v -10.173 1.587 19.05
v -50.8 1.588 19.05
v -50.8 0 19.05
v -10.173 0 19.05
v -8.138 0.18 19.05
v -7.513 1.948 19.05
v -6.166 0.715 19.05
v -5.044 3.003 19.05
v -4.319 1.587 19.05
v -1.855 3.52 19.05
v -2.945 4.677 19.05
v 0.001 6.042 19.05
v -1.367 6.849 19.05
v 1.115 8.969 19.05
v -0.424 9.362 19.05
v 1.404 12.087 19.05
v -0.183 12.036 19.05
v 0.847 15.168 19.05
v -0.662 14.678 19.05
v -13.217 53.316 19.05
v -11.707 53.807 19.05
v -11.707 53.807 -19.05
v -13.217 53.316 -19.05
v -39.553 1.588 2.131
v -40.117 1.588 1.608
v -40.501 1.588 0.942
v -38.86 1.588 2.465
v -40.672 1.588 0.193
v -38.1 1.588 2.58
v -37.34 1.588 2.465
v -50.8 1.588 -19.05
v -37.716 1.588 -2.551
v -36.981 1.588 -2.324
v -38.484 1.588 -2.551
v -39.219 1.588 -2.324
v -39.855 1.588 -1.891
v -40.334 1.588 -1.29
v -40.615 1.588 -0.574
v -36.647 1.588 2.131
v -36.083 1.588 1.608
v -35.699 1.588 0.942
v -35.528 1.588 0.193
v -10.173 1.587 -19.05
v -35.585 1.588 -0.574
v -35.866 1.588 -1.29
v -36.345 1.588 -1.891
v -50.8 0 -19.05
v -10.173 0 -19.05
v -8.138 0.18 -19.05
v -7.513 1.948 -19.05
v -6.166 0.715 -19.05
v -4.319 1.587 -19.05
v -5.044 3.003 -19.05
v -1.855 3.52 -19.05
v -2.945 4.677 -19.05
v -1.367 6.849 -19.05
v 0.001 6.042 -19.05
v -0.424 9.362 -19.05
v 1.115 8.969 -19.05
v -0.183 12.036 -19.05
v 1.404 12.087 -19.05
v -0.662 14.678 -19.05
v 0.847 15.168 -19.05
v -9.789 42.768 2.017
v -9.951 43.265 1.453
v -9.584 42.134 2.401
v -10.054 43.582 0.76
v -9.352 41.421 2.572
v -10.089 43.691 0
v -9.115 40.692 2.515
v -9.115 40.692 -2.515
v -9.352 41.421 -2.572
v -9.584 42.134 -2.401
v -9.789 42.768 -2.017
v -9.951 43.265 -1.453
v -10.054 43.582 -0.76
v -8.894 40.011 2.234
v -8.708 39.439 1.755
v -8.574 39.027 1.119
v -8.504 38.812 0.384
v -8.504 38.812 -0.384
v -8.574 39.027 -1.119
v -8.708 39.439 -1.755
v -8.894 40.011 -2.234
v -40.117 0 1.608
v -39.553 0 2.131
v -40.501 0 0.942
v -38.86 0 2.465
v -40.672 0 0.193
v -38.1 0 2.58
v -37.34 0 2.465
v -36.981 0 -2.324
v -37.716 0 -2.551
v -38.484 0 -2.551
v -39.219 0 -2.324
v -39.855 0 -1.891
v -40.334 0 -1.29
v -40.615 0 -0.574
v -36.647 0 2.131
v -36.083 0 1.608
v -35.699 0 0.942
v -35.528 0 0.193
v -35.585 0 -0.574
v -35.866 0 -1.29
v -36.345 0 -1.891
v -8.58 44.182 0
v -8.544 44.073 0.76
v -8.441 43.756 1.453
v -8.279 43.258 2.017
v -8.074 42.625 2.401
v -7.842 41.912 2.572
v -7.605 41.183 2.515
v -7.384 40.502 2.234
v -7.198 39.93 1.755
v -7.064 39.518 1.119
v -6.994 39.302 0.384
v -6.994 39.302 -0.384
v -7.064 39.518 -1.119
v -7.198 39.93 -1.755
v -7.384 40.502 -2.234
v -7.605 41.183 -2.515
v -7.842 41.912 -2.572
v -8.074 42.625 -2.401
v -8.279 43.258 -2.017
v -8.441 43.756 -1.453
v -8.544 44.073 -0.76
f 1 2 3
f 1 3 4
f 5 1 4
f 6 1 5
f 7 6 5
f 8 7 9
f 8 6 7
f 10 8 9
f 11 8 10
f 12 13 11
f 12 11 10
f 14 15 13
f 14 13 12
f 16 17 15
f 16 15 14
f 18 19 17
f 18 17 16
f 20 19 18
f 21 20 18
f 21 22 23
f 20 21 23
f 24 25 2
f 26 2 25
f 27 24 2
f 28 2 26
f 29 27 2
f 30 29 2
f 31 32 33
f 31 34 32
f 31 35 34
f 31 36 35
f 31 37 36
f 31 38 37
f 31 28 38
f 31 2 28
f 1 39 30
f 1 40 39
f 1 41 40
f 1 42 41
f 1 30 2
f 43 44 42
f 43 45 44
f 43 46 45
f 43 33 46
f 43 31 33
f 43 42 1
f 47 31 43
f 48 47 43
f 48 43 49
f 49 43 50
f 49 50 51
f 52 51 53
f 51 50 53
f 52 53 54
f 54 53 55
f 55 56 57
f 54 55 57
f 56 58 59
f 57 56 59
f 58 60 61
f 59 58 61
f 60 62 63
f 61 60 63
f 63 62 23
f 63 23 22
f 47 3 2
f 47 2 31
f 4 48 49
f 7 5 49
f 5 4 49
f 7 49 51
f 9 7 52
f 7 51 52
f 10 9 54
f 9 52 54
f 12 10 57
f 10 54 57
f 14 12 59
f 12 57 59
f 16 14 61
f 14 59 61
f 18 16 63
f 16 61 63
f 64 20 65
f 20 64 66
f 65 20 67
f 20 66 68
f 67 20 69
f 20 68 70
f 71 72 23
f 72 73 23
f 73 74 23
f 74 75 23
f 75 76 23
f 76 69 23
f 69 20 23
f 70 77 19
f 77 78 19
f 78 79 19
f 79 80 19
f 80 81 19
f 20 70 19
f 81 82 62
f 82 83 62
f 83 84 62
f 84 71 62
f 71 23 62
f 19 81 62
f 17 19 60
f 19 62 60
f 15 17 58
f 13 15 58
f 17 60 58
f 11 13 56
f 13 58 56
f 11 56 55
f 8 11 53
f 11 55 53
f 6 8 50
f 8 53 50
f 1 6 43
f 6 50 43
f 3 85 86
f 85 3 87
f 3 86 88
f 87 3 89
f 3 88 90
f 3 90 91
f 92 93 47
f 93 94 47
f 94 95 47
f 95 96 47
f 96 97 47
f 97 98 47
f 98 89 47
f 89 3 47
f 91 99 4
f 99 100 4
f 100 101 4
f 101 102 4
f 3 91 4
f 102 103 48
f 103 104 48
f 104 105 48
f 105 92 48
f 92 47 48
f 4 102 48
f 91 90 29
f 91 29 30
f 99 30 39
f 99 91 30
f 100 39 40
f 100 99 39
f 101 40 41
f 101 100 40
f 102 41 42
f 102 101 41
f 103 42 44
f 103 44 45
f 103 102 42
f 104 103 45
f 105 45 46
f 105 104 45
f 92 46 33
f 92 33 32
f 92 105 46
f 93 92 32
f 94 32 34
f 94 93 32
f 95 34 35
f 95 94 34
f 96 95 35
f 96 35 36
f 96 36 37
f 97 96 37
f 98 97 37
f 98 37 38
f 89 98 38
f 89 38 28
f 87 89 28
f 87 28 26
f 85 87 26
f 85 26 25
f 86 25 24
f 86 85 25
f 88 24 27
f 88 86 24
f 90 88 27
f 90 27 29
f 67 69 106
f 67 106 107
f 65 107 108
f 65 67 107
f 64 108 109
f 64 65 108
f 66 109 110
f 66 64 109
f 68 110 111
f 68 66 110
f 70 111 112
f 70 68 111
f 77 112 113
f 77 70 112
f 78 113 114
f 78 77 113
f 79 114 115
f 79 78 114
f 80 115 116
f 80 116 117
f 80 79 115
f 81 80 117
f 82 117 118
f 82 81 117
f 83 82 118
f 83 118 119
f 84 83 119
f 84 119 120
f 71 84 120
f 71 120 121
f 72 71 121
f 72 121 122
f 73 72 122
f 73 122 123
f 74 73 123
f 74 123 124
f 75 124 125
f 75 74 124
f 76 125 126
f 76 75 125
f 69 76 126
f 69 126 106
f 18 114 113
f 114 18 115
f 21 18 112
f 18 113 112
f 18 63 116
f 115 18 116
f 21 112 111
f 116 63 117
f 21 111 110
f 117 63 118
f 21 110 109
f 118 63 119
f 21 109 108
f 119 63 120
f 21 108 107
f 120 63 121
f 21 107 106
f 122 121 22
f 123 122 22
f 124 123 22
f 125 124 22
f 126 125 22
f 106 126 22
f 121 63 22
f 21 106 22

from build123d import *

# Parameters (mm, degrees)
SKETCH1_W                  = 101.6
SKETCH1_H                  = 38.1
SKETCH1_R                  = 2.5796875
BOSS_EXTRUDE1_DEPTH        = 1.5875
SKETCHED_START             = -19.05
SKETCHED_BEND1_DEPTH       = 38.1
SKETCHED_BEND1_2_DEPTH     = 16.4703124
SKETCHED_START_2           = 2.5796876
SKETCHED_BEND1_3_DEPTH     = 16.4703124
SKETCHED_START_3           = -2.5796876
SKETCHED_BEND1_4_DEPTH     = 5.1593752
SKETCHED_START_4           = 3.905760394
SKETCHED_BEND1_5_OUTLINE_R = 2.5796875
SKETCHED_BEND1_5_DEPTH     = 1.5875


with BuildPart() as part:
    # Sketch1 → Boss-Extrude1 (new body)
    with BuildSketch(Plane(origin=(0, 0, 0), x_dir=(1, 0, 0), z_dir=(0, 1, 0))):
        Rectangle(SKETCH1_W, SKETCH1_H)
        with Locations(Location((-38.1, 0, 0), (0, 0, 270))):
            Circle(SKETCH1_R, mode=Mode.SUBTRACT)
        with Locations(Location((38.1, 0, 0), (0, 0, 270))):
            Circle(SKETCH1_R, mode=Mode.SUBTRACT)
    extrude(amount=BOSS_EXTRUDE1_DEPTH)

    # Sketched Bend1: read off the stored shape, not the designer's step
    # Sketched Bend1 outline → Sketched Bend1 (cut)
    with BuildSketch(Plane.XY.offset(SKETCHED_START)):
        with BuildLine():
            Line((50.8, 1.5875), (-4.318797944, 1.5875))
            ThreePointArc((-4.318797944, 1.5875), (-7.140118794, 0.403914791), (-10.172869711, 0))
            Line((-10.172869711, 0), (50.8, 0))
            Line((50.8, 0), (50.8, 1.5875))
        make_face()
    extrude(amount=SKETCHED_BEND1_DEPTH, mode=Mode.SUBTRACT)

    # Sketched Bend1 2 outline → Sketched Bend1 2 (add)
    with BuildSketch(Plane.XY.offset(SKETCHED_START)):
        with BuildLine():
            Line((-13.21677824, 53.316366943), (-0.662304548, 14.677669944))
            ThreePointArc((-0.662304548, 14.677669944), (-2.082699768, 5.709647478), (-10.172869711, 1.5875))
            Line((-10.172869711, 1.5875), (-4.318797944, 1.5875))
            ThreePointArc((-4.318797944, 1.5875), (0.657447044, 7.467500578), (0.847497671, 15.168234422))
            Line((0.847497671, 15.168234422), (-11.706976021, 53.806931422))
            Line((-11.706976021, 53.806931422), (-13.21677824, 53.316366943))
        make_face()
    extrude(amount=SKETCHED_BEND1_2_DEPTH)

    # Sketched Bend1 3 outline → Sketched Bend1 3 (add)
    with BuildSketch(Plane.XY.offset(SKETCHED_START_2)):
        with BuildLine():
            Line((-13.21677824, 53.316366943), (-0.662304548, 14.677669944))
            ThreePointArc((-0.662304548, 14.677669944), (-2.082699768, 5.709647478), (-10.172869711, 1.5875))
            Line((-10.172869711, 1.5875), (-4.318797944, 1.5875))
            ThreePointArc((-4.318797944, 1.5875), (0.657447044, 7.467500578), (0.847497671, 15.168234422))
            Line((0.847497671, 15.168234422), (-11.706976021, 53.806931422))
            Line((-11.706976021, 53.806931422), (-13.21677824, 53.316366943))
        make_face()
    extrude(amount=SKETCHED_BEND1_3_DEPTH)

    # Sketched Bend1 4 outline → Sketched Bend1 4 (add)
    with BuildSketch(Plane.XY.offset(SKETCHED_START_3)):
        with BuildLine():
            Line((-13.21677824, 53.316366943), (-0.662304548, 14.677669944))
            ThreePointArc((-0.662304548, 14.677669944), (-2.082699768, 5.709647478), (-10.172869711, 1.5875))
            Line((-10.172869711, 1.5875), (-4.318797944, 1.5875))
            ThreePointArc((-4.318797944, 1.5875), (0.657447044, 7.467500578), (0.847497671, 15.168234422))
            Line((0.847497671, 15.168234422), (-11.706976021, 53.806931422))
            Line((-11.706976021, 53.806931422), (-13.21677824, 53.316366943))
        make_face()
    extrude(amount=SKETCHED_BEND1_4_DEPTH)

    # Sketched Bend1 5 outline → Sketched Bend1 5 (cut)
    with BuildSketch(Plane(origin=(0, 0, 0), x_dir=(-0.30901699437495117, 0.9510565162951524, 0), z_dir=(0.9510565162951524, 0.3090169943749511, 0)).offset(SKETCHED_START_4)):
        with Locations((42.091087294, 0)):
            Circle(SKETCHED_BEND1_5_OUTLINE_R)
    extrude(amount=SKETCHED_BEND1_5_DEPTH, mode=Mode.SUBTRACT)


solid = part.part
